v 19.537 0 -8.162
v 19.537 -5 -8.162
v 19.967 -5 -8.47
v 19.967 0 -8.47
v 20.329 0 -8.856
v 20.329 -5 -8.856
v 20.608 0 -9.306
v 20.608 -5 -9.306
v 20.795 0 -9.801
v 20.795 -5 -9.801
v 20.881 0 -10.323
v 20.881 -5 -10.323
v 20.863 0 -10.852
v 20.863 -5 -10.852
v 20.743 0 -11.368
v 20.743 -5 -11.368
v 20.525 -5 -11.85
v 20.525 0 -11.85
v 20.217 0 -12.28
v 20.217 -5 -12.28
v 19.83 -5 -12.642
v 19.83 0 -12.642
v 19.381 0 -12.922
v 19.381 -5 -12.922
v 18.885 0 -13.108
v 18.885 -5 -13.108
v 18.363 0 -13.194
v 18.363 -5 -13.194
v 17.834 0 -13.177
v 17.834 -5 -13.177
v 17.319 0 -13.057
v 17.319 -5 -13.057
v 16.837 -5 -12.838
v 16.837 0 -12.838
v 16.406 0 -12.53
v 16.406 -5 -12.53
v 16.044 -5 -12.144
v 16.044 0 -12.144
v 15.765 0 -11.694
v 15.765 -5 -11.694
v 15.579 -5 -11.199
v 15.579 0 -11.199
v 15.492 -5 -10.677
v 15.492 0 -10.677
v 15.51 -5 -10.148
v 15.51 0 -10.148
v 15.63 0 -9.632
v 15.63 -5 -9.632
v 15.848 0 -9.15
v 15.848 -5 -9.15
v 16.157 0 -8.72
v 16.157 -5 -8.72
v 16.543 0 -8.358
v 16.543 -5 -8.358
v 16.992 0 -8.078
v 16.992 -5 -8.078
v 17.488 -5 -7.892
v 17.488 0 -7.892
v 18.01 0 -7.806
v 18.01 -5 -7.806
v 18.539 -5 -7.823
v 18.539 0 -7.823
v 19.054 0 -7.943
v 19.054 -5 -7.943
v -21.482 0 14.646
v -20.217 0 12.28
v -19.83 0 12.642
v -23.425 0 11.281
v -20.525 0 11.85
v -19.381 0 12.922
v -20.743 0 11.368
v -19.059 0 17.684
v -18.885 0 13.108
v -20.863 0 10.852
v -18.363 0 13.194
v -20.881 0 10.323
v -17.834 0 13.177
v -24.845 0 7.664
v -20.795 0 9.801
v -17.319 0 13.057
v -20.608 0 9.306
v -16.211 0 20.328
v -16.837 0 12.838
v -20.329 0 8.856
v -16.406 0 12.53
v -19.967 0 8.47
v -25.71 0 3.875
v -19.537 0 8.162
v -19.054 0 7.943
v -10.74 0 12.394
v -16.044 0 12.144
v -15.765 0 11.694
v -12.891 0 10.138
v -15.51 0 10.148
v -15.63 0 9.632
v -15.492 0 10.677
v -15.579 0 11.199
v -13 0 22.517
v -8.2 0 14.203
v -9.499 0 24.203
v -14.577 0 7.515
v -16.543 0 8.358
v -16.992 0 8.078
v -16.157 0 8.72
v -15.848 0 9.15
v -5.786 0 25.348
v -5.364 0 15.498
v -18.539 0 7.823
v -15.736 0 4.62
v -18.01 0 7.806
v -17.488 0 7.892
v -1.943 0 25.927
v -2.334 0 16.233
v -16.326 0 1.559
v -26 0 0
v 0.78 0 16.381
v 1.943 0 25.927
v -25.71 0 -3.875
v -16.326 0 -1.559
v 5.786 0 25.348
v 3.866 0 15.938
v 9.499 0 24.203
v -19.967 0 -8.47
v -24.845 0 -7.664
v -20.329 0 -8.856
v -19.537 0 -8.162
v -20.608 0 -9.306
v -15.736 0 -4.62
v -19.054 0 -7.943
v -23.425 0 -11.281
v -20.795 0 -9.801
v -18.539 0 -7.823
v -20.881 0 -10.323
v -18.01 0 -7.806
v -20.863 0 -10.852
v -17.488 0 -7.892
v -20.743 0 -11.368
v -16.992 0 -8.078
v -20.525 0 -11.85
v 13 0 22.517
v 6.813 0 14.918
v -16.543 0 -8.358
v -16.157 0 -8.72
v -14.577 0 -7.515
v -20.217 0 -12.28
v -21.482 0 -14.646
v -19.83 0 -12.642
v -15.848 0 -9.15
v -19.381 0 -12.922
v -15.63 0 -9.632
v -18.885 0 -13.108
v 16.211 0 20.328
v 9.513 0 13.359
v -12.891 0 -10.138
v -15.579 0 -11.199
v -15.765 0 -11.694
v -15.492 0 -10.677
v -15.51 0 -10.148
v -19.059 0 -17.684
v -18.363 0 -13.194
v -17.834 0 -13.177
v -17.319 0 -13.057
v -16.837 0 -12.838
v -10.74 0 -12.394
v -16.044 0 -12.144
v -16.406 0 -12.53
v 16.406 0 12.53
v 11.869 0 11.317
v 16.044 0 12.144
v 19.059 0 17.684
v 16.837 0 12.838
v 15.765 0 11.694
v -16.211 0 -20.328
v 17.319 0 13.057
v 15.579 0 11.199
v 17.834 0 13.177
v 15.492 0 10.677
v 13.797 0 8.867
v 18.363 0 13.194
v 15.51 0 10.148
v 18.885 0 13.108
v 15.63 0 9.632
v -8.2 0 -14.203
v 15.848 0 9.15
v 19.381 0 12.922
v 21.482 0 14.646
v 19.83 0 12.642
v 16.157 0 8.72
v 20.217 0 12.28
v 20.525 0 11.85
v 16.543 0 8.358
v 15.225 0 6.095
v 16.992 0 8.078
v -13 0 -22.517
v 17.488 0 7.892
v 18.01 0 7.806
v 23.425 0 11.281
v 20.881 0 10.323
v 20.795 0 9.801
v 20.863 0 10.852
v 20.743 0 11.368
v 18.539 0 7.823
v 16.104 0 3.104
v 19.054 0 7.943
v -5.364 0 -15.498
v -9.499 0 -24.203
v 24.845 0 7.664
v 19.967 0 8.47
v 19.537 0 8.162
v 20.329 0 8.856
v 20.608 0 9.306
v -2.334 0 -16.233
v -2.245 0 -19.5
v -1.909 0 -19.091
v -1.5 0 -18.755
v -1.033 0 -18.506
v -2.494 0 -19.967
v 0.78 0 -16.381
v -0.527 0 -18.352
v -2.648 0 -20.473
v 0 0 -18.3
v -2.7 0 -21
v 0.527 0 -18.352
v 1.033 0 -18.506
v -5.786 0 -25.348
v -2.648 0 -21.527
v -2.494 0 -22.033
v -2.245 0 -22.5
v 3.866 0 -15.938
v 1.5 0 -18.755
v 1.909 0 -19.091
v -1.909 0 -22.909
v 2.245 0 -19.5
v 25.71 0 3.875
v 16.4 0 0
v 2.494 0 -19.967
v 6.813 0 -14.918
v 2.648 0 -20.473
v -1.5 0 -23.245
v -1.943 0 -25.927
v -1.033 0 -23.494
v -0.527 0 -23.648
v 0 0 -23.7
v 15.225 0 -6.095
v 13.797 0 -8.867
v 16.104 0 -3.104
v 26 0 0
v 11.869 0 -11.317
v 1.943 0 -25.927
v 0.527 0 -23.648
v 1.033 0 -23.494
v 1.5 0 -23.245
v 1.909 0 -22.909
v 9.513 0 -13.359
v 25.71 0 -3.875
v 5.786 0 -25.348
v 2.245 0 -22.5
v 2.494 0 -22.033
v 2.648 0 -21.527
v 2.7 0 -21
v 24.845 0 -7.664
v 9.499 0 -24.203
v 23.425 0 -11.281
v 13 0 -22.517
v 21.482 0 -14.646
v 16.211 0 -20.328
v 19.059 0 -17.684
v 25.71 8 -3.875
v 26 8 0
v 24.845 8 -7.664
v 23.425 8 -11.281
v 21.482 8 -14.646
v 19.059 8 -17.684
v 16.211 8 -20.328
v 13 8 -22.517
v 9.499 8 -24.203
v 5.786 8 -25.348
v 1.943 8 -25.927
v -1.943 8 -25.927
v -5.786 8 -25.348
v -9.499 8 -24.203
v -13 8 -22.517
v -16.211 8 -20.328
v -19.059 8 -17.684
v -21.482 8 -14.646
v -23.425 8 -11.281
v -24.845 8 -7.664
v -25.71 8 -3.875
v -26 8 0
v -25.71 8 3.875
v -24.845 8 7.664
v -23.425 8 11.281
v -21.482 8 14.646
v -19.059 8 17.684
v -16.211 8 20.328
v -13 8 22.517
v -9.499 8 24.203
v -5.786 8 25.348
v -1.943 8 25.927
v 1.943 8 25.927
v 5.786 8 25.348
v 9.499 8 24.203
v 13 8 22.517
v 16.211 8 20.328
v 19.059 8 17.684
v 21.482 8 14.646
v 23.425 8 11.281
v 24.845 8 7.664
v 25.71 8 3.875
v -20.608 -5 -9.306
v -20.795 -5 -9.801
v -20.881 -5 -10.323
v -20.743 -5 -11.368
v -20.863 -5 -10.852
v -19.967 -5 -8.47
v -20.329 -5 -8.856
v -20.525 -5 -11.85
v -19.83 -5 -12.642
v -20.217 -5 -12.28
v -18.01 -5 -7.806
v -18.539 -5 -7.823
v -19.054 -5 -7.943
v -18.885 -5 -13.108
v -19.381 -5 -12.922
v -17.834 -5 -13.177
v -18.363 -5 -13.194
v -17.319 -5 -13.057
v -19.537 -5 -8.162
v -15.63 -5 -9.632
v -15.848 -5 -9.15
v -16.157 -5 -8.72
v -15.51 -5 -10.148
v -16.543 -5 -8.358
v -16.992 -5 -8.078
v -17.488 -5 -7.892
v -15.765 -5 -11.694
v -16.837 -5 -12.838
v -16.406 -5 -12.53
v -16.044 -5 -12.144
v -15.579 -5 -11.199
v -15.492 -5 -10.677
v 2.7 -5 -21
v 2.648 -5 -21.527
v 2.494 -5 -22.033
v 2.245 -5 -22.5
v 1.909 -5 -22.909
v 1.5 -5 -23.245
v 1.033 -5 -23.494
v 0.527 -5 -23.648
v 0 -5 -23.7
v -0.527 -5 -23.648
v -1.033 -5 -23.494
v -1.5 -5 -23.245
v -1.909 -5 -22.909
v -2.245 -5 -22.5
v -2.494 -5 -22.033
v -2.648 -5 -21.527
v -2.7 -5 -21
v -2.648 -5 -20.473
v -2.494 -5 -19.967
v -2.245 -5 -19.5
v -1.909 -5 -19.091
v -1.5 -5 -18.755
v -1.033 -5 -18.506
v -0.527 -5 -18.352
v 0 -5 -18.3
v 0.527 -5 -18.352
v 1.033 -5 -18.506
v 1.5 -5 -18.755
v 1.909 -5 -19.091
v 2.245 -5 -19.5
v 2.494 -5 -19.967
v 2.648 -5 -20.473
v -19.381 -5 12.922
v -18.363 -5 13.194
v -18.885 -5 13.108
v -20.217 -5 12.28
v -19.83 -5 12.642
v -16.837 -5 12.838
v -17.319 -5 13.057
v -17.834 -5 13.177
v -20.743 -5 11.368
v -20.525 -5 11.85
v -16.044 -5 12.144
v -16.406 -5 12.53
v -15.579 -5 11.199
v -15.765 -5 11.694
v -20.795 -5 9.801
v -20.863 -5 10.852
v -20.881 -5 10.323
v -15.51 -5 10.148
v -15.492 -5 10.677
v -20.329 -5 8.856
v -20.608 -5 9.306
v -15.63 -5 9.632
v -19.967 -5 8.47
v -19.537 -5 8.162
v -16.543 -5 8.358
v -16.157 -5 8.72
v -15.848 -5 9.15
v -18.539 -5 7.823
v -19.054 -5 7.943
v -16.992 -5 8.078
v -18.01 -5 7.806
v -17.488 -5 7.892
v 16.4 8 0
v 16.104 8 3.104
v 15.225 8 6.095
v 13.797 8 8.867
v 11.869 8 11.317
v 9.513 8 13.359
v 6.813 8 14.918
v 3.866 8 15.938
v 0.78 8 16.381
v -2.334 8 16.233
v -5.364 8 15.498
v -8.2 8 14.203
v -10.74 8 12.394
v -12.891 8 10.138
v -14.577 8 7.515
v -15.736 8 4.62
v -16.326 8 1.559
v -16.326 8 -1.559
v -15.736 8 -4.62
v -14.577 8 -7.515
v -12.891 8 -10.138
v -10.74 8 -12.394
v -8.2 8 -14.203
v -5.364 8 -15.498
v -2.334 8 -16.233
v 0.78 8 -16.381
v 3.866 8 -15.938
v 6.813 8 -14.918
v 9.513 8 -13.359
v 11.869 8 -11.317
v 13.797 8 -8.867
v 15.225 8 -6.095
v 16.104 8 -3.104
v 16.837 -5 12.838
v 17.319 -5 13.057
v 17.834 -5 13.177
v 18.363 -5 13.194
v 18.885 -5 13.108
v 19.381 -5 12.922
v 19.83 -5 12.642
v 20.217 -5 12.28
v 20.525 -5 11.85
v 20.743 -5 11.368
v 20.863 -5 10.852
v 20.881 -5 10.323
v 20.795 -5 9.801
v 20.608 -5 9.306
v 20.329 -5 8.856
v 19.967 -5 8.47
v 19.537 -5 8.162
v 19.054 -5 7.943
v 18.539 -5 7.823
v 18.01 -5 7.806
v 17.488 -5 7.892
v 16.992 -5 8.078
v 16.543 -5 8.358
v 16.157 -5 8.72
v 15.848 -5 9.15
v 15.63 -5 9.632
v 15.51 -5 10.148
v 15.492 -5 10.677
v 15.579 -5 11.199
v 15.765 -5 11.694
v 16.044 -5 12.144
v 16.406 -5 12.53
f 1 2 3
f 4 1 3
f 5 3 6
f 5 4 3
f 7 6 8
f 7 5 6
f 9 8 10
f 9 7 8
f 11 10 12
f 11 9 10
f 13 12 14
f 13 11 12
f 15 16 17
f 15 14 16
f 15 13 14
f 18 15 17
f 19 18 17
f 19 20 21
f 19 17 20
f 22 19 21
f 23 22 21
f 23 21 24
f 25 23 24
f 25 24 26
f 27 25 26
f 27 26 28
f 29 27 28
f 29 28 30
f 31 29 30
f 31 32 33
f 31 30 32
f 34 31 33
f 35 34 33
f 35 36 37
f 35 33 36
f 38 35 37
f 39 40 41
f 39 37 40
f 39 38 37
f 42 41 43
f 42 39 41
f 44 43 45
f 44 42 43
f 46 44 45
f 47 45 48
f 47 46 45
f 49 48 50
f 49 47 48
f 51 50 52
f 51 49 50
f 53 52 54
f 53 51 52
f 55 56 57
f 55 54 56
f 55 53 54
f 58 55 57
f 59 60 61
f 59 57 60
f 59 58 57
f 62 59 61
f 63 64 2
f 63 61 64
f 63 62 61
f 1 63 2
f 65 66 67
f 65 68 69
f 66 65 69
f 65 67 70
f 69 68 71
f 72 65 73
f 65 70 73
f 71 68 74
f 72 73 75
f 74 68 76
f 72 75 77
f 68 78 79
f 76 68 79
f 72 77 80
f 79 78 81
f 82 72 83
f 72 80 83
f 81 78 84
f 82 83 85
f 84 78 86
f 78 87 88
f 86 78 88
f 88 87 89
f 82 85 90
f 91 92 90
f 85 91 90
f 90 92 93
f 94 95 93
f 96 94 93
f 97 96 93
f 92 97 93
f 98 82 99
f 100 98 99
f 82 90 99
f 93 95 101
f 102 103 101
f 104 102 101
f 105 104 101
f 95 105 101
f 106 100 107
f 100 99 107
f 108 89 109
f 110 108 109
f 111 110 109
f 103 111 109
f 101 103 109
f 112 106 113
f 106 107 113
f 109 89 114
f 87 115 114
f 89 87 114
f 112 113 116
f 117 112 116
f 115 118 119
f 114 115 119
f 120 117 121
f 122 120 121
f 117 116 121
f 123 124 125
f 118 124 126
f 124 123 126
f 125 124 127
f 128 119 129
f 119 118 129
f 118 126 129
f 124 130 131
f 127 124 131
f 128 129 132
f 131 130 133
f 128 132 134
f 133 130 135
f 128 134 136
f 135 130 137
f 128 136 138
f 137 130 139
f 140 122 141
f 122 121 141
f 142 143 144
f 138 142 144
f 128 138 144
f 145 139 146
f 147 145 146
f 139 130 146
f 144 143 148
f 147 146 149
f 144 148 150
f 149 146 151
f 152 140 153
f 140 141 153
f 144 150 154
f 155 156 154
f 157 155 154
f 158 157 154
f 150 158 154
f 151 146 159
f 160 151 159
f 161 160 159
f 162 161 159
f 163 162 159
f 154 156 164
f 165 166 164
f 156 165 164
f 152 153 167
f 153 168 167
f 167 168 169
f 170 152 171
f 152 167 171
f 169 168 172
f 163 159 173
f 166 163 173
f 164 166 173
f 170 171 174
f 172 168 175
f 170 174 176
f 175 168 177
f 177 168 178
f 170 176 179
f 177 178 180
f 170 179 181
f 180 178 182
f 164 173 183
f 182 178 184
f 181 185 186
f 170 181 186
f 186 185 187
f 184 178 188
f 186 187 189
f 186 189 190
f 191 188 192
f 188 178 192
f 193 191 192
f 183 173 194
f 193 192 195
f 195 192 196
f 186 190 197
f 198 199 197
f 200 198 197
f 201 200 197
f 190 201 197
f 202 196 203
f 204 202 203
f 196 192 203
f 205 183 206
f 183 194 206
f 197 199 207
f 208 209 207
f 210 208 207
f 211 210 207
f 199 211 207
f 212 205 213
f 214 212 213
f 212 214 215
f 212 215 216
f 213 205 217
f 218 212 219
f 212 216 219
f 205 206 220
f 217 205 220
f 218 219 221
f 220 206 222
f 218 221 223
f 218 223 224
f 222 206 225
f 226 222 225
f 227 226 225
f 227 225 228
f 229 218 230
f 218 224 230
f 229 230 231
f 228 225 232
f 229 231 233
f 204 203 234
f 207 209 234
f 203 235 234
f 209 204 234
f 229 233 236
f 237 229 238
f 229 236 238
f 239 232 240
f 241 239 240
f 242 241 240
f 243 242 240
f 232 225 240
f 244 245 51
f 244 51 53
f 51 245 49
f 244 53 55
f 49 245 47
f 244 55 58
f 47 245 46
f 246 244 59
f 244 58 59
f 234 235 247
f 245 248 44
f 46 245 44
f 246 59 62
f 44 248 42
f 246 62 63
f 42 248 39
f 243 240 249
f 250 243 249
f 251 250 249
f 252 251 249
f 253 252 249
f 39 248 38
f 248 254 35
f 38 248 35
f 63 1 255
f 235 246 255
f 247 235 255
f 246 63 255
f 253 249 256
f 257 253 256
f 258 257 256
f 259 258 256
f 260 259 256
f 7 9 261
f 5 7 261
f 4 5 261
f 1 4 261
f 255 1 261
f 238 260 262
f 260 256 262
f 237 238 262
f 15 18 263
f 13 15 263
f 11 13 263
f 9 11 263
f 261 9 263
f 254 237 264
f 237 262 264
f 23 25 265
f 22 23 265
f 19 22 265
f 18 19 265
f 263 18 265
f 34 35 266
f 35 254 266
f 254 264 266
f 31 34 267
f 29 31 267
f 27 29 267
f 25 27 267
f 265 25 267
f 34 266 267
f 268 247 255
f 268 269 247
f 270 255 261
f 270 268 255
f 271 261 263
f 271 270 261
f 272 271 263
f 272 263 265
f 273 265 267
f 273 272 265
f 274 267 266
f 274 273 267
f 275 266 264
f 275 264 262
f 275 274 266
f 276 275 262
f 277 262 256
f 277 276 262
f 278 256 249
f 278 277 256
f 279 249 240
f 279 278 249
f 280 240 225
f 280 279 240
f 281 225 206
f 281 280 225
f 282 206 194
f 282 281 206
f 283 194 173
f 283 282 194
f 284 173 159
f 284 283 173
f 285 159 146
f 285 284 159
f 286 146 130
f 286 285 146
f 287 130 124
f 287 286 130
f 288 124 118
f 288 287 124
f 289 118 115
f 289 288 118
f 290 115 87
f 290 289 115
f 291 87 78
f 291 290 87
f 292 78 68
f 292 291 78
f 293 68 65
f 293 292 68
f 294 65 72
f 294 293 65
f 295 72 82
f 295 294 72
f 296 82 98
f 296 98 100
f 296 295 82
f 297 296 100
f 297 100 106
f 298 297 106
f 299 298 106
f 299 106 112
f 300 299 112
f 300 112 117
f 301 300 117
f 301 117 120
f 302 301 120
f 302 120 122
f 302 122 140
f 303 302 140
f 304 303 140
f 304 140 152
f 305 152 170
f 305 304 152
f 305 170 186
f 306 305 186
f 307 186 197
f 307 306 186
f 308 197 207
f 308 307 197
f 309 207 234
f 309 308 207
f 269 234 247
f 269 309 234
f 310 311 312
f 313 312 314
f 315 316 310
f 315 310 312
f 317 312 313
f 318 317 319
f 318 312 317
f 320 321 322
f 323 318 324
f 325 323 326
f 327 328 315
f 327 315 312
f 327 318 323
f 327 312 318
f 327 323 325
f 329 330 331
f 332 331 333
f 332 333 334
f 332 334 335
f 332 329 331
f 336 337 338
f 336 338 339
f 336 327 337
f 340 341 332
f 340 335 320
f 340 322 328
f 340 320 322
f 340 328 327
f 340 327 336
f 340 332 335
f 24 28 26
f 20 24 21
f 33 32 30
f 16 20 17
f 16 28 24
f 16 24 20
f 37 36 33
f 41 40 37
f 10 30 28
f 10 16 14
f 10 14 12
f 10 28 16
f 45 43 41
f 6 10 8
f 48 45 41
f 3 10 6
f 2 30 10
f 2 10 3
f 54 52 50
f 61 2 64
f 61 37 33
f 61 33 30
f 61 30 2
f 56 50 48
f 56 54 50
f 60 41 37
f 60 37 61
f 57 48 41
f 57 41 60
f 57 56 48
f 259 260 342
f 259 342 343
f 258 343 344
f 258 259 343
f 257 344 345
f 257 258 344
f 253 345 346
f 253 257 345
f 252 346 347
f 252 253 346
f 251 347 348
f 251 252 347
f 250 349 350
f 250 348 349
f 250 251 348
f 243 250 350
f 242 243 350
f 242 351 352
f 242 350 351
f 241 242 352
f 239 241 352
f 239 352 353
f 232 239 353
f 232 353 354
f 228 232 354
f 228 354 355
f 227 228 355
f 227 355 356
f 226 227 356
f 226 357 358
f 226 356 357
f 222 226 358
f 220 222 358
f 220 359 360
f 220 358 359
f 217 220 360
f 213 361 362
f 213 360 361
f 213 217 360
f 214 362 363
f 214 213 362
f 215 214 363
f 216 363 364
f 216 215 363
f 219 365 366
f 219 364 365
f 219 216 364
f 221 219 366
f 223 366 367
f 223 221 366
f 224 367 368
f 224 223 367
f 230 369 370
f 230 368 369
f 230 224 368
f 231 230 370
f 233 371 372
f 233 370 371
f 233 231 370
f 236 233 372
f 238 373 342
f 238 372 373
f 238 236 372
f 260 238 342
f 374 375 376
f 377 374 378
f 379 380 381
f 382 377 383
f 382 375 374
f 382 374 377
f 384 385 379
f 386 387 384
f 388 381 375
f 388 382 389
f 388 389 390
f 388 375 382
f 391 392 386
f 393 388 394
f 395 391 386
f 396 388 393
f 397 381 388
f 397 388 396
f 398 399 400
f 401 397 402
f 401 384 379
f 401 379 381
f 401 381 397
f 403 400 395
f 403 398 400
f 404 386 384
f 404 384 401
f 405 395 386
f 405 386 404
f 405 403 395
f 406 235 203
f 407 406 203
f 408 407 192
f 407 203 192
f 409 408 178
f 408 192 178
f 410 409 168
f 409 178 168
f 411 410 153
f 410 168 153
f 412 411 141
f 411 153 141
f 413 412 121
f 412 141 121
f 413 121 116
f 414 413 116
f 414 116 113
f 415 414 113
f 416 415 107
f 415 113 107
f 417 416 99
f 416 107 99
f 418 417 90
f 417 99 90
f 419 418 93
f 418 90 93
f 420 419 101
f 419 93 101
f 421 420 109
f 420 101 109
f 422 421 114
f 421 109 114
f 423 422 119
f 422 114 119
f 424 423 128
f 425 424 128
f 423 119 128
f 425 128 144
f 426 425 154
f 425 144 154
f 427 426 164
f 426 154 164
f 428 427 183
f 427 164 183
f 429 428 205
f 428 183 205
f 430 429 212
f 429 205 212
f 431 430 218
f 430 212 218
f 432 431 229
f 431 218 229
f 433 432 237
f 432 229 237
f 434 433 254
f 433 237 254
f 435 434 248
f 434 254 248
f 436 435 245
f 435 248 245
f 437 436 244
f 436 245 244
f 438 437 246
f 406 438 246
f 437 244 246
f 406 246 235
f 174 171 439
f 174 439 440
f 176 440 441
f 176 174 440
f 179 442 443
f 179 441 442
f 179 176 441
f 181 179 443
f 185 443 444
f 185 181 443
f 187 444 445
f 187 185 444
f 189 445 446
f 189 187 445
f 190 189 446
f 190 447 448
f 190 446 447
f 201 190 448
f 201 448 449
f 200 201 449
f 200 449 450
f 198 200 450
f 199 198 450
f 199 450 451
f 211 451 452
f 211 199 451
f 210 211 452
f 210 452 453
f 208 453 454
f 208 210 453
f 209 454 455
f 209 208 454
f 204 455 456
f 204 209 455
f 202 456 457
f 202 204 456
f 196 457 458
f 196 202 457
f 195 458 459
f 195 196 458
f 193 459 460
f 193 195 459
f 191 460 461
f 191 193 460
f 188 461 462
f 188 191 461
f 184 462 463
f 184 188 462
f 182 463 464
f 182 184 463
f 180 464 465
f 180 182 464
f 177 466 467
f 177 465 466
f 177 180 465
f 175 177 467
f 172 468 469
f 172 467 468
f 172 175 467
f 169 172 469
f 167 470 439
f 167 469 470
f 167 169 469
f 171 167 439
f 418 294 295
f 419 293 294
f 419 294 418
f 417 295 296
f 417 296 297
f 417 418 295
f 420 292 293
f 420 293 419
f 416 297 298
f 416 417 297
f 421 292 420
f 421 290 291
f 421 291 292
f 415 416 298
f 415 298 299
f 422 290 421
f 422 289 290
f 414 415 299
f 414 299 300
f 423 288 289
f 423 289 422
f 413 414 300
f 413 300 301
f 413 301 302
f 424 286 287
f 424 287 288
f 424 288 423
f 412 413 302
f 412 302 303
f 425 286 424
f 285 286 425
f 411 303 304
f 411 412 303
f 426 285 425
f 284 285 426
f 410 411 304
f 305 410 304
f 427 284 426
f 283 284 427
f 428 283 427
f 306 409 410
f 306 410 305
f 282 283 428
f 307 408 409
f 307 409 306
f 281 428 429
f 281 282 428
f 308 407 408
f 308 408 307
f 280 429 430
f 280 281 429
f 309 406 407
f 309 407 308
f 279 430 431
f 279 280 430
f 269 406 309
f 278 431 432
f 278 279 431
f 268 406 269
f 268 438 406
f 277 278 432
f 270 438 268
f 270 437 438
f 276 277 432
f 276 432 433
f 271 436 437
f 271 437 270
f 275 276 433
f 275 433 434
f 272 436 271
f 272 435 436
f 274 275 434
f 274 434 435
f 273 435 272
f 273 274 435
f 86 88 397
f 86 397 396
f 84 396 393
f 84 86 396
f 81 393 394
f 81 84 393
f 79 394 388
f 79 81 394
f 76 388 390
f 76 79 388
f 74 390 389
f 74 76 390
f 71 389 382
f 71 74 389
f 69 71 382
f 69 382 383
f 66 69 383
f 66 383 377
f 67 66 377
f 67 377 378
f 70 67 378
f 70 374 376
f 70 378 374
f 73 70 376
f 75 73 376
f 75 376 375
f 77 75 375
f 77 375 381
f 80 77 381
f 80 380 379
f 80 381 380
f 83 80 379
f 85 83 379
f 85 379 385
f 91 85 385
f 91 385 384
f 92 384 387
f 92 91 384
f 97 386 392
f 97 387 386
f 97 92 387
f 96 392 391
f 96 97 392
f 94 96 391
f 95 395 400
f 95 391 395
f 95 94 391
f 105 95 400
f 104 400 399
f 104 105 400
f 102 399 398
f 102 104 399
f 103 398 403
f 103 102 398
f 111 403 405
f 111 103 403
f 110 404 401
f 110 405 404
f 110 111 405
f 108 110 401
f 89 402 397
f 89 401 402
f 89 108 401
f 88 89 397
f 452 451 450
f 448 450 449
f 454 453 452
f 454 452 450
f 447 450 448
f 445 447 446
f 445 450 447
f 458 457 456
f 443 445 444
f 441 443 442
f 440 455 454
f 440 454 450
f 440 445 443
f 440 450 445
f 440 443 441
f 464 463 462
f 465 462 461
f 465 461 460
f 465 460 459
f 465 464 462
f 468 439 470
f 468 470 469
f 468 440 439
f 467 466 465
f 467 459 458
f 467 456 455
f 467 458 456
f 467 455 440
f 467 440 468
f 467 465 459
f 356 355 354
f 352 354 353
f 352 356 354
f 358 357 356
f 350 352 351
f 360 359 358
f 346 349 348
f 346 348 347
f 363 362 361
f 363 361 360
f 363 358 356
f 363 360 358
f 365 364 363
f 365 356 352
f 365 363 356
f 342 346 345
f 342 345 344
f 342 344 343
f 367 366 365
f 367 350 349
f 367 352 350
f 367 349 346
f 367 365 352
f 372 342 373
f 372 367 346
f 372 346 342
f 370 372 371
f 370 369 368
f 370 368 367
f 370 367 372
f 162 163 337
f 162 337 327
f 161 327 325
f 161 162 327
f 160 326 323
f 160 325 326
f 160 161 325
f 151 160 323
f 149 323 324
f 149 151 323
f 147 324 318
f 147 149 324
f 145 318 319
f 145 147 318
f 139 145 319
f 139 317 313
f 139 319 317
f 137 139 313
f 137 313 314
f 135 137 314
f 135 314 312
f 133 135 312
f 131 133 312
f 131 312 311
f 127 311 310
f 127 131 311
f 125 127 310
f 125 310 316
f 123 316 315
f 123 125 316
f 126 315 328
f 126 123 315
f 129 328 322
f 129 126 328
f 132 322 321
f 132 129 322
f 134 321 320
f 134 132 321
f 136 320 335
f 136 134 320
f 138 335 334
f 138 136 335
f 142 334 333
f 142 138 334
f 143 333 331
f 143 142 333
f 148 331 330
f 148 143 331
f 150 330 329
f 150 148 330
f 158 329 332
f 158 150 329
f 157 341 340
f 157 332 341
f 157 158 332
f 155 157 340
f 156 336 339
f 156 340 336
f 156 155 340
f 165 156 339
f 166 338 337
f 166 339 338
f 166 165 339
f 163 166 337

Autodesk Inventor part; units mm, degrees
ref_plane "YZ Plane" through (0, 0, 0) normal (1, 0, 0) x (0, 1, 0)
ref_plane "XZ Plane" through (0, 0, 0) normal (0, 1, 0) x (-1, 0, 0)
ref_plane "XY Plane" through (0, 0, 0) normal (0, 0, 1) x (1, 0, 0)
sketch "Sketch1" plane through (0, 0, 0) normal (0, 1, 0) x (-1, 0, 0)
  line L0 (26, 0) -> (-26, 0)
  line L1 (-26, 0) -> (-26, -26)
  line L2 (-26, -26) -> (26, -26)
  line L3 (26, -26) -> (26, 0)
  point P0 (0, 0)
  dimension "d0" = 52
  dimension "d1" = 26
  dimension "d2" = 26
  dimension "d3" = 26
extrude "Extrusion1" add sketch "Sketch1" along normal blind 35
sketch "Sketch3" plane through (-26, 0, 0) normal (0, 0, 1) x (1, 0, 0)
  line L0 (0, 35) -> (52, 35) projected
  line L1 (38.8, 35) -> (65.2826, 35)
  line L2 (65.2826, 35) -> (65.2826, 0)
  line L3 (26, -13.8937) -> (26, 45.4279) projected
  line L4 (52, 0) -> (52, 35) projected
  arc A0 (52, 10.4979) -> (38.8, 35) centre (22.6594, 10.4979) ccw
  line L5 (52, 10.4979) -> (52, 0)
  line L6 (65.2826, 0) -> (52, 0)
  point P0 (26, 0)
  point P1 (52, 10.9288)
  dimension "d7" = 90
  dimension "d33" = 12.8
revolve "Revolution1" cut sketch "Sketch3" angle 360 about axis through (0, 35, 0) along (0, 1, 0)
sketch "Sketch2" plane through (0, 35, 0) normal (0, 1, 0) x (1, 0, 0)
  circle A0 centre (0, 0) radius 12.8
  dimension "d6" = 25.6
extrude "Extrusion2" cut sketch "Sketch2" against normal blind 1
sketch "Sketch4" plane through (0, 34, 0) normal (0, 1, 0) x (1, 0, 0)
  circle A0 centre (0, 0) radius 11.4
  dimension "d11" = 22.8
extrude "Extrusion3" cut sketch "Sketch4" against normal through all
sketch "Sketch5" plane through (0, 0, 0) normal (0, -1, 0) x (1, 0, 0)
  circle A0 centre (0, 0) radius 16.4
  dimension "d16" = 32.8
extrude "Extrusion4" cut sketch "Sketch5" against normal blind 26
sketch "Sketch8" plane through (0, 0, 0) normal (0, -1, 0) x (1, 0, 0)
  circle A0 centre (0, -21) radius 2.7
  point P0 (0, 0)
  dimension "d21" = 5.4
  dimension "d22" = 21
extrude "Extrusion5" add sketch "Sketch8" along normal blind 5
pattern_circular "Circular Pattern1" count 5 over 240 about axis through (0, 35, 0) along (0, 1, 0) of "Extrusion5" both ways yes
mirror "Mirror1" about plane through (-26, 0, 0) normal (0, 0, 1) of "Extrusion4", "Extrusion1", "Revolution1", "Extrusion2", "Extrusion3"
fillet "Fillet2" radius 1 1 edges at (-16.4, 26, 0)
ref_plane "Work Plane1" through (0, 8, 0) normal (0, 1, 0) x (1, 0, 0)
sketch "Sketch10" plane through (0, 8, 0) normal (0, 1, 0) x (1, 0, 0)
  circle A0 centre (0, 0) radius 42.5144
extrude "Extrusion7" cut sketch "Sketch10" along normal blind 40
equation "\"d1\" = 0.5 * d0"
equation "\"d2\" = 0.5 * d0"
equation "\"d3\" = d1"
equation "\"d33\" = 0.5 * d6"
properties part number "_3DPrint"
